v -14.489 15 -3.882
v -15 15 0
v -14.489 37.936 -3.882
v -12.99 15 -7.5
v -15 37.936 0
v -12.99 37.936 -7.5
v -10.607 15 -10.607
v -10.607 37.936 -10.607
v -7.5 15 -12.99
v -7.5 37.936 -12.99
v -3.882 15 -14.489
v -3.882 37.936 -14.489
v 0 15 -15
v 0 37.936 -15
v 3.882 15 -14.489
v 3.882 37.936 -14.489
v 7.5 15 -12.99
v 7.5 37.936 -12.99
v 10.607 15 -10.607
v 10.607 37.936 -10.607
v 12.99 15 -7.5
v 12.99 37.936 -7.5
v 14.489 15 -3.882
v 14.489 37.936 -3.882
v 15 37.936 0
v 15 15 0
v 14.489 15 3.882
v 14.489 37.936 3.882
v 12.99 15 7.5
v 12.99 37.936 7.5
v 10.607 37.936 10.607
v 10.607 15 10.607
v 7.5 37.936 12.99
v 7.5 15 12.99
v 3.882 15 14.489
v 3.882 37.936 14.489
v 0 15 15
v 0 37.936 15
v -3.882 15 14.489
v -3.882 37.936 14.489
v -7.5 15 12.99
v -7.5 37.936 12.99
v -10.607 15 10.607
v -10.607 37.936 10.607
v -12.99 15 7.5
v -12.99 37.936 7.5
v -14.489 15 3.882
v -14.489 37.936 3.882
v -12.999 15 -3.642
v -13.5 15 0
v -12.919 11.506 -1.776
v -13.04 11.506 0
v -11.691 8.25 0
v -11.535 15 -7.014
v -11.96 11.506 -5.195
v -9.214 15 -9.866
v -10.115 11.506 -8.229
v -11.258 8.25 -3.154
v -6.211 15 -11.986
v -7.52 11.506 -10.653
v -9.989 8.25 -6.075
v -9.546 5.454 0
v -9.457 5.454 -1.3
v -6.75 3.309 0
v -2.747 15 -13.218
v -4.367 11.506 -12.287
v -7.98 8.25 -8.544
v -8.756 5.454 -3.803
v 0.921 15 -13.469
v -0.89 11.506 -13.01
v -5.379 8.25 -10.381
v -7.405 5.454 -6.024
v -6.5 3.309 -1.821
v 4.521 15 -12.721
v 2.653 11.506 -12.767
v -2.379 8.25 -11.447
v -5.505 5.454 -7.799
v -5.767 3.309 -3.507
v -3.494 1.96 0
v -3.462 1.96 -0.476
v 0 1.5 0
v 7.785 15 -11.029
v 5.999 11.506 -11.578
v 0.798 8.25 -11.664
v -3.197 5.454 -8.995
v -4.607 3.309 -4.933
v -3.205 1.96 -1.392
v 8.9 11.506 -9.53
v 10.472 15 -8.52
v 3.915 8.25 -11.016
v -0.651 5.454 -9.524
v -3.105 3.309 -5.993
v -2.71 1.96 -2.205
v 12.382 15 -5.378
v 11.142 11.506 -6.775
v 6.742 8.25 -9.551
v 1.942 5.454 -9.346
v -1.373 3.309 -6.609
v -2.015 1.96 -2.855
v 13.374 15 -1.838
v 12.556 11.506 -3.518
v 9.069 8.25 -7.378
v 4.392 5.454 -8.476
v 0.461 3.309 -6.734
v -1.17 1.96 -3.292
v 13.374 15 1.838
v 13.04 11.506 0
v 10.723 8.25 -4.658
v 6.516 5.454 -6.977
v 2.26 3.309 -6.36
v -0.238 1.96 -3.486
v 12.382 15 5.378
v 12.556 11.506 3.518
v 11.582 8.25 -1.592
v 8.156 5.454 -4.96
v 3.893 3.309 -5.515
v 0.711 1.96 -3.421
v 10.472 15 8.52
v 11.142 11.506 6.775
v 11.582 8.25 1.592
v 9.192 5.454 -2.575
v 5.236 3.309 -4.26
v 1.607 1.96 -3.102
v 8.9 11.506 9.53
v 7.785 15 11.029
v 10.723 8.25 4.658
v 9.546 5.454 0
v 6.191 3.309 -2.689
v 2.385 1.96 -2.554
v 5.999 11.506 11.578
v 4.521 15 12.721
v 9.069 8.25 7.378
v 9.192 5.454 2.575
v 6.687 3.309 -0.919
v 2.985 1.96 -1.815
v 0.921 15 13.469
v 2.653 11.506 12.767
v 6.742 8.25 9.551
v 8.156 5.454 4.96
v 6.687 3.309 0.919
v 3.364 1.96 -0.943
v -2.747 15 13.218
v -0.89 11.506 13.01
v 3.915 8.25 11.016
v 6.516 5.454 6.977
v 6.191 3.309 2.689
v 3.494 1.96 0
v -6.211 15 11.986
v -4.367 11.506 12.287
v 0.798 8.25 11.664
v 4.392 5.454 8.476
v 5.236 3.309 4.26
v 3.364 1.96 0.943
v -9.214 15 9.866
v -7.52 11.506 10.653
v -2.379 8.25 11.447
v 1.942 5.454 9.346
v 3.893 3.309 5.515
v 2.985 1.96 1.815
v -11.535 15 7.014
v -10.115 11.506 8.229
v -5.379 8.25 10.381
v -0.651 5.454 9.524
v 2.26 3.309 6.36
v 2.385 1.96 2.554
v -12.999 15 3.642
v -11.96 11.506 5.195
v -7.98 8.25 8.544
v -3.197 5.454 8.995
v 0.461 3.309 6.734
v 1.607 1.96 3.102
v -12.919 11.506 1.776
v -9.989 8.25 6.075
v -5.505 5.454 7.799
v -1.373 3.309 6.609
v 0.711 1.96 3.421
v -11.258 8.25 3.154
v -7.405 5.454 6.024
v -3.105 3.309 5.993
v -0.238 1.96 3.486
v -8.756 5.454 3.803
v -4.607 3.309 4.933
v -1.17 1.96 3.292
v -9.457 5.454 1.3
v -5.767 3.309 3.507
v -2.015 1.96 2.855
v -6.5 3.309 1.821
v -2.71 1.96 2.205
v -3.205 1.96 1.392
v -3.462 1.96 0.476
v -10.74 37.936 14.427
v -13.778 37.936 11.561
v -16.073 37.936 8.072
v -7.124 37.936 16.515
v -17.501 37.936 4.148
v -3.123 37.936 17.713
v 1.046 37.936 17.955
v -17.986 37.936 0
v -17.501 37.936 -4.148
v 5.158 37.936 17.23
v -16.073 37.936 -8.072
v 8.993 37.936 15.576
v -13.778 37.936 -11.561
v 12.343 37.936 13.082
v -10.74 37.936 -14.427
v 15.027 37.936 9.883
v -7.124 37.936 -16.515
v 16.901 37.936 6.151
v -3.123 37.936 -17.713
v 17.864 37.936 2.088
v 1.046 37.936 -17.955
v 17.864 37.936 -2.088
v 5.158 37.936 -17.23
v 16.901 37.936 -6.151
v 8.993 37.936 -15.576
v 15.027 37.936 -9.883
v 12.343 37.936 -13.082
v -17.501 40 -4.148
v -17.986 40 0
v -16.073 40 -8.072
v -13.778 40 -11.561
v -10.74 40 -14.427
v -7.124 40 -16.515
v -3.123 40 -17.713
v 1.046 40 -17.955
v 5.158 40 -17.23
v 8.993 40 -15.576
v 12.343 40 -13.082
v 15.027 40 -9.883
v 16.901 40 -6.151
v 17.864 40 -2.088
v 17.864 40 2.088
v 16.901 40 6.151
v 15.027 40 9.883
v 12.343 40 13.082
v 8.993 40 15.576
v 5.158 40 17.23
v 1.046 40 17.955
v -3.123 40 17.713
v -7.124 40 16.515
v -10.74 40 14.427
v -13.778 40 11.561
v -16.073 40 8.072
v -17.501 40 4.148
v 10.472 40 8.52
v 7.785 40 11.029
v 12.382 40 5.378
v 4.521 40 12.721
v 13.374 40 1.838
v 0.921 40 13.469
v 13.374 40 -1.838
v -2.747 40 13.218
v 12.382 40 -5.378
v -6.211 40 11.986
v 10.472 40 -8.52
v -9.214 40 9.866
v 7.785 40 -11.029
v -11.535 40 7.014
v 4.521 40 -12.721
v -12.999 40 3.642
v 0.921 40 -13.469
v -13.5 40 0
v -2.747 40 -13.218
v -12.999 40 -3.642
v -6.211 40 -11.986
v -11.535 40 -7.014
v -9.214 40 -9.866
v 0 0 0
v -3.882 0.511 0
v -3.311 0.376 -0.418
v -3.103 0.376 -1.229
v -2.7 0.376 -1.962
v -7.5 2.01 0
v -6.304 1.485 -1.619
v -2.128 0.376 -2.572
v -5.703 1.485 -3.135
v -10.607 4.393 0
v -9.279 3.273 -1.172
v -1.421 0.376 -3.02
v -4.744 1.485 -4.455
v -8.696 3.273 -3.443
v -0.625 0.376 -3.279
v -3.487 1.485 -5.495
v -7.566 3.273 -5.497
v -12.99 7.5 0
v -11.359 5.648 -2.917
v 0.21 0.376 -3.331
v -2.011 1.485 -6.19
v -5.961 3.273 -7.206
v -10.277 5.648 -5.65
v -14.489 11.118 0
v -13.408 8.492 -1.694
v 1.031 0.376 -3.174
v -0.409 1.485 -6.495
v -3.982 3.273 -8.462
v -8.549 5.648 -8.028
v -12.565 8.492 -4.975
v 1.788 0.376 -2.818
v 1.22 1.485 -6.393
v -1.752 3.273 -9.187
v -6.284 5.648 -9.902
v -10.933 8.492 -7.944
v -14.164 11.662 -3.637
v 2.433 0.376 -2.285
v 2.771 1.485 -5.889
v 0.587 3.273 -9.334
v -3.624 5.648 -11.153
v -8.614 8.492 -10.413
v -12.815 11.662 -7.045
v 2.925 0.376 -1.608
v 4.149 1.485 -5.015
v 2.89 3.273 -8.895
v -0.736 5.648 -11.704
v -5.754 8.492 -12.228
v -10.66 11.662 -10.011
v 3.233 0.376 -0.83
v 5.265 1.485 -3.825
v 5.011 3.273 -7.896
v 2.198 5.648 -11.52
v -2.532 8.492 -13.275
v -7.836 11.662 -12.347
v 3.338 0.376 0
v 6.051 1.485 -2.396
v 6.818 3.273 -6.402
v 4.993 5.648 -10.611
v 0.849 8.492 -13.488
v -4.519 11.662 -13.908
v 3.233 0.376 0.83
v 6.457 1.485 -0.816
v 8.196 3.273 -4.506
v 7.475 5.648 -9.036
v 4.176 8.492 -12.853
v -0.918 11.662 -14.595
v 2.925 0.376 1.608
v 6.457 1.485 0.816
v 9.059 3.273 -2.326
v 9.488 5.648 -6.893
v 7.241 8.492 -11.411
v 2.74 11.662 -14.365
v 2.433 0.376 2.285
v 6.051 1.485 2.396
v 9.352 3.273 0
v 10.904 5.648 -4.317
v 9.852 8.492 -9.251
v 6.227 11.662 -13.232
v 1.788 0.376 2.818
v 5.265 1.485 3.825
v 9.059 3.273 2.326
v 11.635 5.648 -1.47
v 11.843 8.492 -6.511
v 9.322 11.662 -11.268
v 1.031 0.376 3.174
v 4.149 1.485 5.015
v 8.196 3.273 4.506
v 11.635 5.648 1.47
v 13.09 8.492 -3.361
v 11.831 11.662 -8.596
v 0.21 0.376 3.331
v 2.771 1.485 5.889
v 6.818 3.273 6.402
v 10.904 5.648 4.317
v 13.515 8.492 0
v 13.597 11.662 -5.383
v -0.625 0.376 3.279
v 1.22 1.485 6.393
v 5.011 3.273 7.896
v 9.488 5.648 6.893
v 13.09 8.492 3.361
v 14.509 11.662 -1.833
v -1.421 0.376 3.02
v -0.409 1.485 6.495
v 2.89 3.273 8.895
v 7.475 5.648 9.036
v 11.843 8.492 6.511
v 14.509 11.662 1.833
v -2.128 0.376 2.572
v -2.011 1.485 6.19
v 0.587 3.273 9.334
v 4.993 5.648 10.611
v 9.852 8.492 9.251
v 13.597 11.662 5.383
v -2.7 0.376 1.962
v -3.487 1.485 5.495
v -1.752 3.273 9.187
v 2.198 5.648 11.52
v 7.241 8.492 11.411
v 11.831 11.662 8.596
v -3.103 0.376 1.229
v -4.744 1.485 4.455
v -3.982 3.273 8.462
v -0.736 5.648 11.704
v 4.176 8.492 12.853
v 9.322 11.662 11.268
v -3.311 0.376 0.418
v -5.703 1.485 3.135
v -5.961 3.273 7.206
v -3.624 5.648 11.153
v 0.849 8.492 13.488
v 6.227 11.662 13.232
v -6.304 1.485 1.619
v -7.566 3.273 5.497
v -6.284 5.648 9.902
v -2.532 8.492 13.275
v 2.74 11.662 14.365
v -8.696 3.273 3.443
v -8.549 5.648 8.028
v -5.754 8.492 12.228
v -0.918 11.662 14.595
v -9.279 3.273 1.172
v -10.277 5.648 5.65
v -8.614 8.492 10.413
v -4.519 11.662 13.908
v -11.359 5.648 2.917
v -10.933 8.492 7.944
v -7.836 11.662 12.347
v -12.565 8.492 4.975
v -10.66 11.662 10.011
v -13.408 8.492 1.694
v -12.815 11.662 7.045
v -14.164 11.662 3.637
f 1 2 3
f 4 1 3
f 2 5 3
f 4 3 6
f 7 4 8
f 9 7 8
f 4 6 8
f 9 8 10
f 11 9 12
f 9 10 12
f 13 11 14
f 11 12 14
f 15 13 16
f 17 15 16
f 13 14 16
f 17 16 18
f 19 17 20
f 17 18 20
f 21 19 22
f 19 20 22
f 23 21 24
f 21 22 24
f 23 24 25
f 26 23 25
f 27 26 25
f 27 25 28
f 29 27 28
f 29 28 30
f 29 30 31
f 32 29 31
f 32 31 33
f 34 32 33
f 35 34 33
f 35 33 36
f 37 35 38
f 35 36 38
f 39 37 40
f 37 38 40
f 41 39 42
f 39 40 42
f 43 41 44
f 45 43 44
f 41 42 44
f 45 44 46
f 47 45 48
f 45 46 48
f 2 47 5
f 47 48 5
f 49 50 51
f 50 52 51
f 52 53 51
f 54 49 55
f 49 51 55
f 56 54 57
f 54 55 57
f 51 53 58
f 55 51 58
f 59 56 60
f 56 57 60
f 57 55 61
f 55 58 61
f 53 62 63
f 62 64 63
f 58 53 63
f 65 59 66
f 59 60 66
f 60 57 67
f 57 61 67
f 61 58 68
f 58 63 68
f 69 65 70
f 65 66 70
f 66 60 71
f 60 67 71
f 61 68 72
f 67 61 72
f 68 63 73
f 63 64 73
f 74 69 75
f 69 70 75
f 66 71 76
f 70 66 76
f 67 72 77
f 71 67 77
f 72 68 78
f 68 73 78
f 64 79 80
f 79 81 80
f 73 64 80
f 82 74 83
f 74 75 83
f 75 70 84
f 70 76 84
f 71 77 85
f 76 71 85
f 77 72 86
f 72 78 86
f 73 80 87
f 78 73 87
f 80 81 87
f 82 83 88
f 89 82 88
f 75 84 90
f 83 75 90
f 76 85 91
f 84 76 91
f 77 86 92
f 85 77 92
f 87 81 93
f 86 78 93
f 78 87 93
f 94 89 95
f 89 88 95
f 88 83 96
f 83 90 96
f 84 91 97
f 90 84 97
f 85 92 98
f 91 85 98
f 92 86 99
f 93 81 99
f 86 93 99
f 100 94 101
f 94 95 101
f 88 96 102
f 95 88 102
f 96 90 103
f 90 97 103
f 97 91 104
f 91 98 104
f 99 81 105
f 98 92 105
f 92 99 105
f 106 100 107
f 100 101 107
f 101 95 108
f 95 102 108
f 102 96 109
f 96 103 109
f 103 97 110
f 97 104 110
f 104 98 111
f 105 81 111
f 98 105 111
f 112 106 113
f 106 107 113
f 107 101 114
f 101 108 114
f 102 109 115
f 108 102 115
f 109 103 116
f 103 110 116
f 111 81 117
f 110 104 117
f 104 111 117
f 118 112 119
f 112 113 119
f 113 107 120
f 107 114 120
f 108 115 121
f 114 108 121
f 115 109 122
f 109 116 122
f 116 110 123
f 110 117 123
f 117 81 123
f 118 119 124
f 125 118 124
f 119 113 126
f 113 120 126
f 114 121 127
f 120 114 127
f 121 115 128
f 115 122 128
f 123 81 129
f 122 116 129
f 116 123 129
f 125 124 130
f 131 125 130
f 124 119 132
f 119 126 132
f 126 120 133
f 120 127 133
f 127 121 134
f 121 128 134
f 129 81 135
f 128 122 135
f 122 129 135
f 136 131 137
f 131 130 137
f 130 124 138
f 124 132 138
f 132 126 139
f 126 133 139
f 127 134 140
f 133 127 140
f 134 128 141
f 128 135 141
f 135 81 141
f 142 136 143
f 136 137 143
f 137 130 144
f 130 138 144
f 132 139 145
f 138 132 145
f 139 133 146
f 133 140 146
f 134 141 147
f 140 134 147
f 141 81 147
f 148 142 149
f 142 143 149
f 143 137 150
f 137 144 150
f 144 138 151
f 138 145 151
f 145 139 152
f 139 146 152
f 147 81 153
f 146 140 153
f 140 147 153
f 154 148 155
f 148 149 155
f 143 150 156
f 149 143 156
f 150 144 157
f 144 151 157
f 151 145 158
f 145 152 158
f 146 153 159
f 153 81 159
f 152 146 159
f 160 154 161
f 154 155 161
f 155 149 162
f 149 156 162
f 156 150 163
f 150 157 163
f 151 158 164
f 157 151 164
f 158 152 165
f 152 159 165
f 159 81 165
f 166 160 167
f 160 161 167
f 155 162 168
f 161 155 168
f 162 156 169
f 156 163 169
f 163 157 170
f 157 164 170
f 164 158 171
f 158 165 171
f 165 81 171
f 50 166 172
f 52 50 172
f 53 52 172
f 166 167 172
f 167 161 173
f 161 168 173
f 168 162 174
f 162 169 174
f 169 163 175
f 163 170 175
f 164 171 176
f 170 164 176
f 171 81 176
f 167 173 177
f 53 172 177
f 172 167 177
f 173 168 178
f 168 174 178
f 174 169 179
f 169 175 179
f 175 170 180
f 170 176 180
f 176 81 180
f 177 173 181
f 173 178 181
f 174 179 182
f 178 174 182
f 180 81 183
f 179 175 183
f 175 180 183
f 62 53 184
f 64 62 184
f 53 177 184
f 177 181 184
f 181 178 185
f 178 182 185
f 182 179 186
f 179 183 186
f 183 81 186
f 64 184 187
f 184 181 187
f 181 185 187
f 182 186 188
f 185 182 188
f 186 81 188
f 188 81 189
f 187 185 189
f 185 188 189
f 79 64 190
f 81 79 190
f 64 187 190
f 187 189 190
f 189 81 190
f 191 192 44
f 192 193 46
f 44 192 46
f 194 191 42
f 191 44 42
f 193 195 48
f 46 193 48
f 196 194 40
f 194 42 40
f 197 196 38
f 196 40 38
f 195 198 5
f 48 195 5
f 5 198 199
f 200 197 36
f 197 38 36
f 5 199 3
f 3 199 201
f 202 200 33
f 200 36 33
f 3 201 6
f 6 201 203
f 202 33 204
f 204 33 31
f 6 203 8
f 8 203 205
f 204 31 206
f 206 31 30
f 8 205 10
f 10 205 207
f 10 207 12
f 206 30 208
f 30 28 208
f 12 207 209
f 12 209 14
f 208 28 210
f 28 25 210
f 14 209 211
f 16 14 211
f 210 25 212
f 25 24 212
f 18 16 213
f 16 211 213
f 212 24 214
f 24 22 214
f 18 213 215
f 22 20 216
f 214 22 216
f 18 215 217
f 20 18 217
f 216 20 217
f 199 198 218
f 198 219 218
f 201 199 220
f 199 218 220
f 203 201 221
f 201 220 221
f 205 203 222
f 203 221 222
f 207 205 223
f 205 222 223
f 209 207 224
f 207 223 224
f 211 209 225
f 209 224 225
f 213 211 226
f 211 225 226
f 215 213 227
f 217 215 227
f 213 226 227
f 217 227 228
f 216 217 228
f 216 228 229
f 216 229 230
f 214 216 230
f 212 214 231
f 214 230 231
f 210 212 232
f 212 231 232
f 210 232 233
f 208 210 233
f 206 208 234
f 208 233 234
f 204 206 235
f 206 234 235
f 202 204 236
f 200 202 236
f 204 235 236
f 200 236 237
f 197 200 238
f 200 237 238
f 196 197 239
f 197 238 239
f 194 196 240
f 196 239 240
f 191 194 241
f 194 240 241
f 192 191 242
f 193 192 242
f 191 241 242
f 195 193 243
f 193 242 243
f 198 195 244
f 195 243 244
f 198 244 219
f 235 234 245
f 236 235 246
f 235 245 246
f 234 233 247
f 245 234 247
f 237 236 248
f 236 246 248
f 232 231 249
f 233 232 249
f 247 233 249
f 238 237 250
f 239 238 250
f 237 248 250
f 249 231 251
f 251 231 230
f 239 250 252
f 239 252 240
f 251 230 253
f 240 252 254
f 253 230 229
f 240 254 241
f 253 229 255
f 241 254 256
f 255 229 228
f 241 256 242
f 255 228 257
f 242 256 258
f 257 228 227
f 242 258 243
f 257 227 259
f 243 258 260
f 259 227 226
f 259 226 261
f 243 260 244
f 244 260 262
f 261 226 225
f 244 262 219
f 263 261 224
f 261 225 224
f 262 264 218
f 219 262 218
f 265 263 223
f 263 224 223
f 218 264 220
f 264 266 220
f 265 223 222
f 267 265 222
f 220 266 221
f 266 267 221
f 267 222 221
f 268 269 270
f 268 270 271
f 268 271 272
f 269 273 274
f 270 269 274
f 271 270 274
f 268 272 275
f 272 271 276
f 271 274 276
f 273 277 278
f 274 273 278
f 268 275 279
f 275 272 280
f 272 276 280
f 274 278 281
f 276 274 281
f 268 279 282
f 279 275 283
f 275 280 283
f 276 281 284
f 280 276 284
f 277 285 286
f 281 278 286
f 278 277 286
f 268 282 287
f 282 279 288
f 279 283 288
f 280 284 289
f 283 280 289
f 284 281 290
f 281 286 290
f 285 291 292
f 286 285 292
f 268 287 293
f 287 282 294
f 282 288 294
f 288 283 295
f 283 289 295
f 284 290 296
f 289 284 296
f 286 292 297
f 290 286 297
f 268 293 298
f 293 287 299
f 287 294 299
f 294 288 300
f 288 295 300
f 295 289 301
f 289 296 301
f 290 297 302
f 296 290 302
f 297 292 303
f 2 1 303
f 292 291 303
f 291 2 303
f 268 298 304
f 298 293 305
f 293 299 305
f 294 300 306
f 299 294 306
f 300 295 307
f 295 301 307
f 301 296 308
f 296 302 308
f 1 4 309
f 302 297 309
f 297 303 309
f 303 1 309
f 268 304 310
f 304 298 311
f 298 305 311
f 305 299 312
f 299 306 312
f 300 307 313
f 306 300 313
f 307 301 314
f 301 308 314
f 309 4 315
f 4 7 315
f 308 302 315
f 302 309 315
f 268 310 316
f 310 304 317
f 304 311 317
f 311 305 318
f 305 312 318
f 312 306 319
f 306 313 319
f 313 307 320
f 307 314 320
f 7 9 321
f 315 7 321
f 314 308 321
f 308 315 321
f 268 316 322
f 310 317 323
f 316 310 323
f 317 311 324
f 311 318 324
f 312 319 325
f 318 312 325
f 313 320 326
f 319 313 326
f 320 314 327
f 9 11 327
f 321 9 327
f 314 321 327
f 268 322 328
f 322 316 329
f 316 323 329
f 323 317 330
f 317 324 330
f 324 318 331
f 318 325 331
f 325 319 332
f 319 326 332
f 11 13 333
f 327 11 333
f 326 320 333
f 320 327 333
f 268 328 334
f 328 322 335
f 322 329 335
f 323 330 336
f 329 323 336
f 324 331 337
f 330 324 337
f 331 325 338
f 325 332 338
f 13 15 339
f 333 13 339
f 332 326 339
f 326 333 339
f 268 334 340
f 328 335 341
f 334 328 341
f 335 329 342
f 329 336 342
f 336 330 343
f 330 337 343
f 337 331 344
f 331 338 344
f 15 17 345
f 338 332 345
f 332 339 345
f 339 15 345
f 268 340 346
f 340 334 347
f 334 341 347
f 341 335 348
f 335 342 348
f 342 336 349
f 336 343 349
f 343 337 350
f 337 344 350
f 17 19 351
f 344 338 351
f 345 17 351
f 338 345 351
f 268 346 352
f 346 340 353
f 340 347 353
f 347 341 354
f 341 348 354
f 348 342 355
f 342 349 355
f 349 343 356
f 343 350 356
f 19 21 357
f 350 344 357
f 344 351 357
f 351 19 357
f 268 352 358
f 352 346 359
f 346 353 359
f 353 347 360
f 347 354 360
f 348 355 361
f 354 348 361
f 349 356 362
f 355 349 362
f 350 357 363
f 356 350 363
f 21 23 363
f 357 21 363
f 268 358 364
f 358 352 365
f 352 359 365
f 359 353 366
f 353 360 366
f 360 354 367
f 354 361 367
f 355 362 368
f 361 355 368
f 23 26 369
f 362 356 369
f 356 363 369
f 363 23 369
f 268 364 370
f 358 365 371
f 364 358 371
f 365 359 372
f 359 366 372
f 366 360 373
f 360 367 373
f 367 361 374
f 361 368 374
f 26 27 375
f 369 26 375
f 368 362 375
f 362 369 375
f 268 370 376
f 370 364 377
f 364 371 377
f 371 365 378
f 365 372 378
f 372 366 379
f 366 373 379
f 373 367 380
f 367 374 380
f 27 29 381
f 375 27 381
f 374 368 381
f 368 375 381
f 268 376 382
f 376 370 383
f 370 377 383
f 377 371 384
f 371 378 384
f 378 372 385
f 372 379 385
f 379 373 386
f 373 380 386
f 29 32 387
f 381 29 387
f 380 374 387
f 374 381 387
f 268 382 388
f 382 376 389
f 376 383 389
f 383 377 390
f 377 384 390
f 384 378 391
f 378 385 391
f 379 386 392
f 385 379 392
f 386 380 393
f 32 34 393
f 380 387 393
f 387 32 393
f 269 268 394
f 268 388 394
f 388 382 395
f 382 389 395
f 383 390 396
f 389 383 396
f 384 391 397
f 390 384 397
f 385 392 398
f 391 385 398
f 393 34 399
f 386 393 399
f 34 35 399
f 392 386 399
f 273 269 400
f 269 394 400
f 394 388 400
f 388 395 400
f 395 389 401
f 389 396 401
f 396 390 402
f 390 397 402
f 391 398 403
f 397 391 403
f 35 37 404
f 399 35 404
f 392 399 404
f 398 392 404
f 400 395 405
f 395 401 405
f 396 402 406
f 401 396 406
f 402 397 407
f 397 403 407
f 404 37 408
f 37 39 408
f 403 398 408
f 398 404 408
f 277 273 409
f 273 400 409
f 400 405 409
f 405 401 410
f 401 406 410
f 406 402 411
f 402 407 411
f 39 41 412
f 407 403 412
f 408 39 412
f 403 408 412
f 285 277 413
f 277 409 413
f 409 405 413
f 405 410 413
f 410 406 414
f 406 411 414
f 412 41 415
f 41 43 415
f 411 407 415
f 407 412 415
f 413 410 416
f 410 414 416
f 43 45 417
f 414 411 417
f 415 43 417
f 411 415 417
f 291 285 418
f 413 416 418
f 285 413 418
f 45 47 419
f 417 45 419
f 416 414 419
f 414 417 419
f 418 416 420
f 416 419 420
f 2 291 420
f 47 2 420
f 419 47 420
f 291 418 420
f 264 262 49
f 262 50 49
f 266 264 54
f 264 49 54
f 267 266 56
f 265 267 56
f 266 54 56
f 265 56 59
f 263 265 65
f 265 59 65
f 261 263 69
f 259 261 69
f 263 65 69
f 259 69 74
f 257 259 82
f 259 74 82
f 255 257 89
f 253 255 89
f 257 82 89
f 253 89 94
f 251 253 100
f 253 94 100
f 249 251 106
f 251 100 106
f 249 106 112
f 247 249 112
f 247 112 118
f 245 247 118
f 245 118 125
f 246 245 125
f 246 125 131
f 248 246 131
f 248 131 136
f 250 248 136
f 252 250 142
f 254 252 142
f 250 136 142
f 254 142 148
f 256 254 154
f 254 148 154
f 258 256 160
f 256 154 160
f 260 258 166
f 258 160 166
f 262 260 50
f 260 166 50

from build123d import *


with BuildPart() as part:
    # Sketch2 → Revolve1 (revolve)
    with BuildSketch(Plane.XY):
        with BuildLine():
            Line((-13.5, 40), (-13.5, 15))
            ThreePointArc((-13.5, 15), (-9.545941546, 5.454058454), (0, 1.5))
            Line((0, 1.5), (0, 0))
            ThreePointArc((0, 0), (-10.606601718, 4.393398282), (-15, 15))
            Line((-15, 15), (-15, 37.935568233))
            Line((-15, 37.935568233), (-17.985762804, 37.935568233))
            Line((-17.985762804, 37.935568233), (-17.985762804, 40))
            Line((-17.985762804, 40), (-15, 40))
            Line((-15, 40), (-13.5, 40))
        make_face()
    revolve(axis=Axis((0, 107.077522155, 0), (0, -1, 0)))


solid = part.part
